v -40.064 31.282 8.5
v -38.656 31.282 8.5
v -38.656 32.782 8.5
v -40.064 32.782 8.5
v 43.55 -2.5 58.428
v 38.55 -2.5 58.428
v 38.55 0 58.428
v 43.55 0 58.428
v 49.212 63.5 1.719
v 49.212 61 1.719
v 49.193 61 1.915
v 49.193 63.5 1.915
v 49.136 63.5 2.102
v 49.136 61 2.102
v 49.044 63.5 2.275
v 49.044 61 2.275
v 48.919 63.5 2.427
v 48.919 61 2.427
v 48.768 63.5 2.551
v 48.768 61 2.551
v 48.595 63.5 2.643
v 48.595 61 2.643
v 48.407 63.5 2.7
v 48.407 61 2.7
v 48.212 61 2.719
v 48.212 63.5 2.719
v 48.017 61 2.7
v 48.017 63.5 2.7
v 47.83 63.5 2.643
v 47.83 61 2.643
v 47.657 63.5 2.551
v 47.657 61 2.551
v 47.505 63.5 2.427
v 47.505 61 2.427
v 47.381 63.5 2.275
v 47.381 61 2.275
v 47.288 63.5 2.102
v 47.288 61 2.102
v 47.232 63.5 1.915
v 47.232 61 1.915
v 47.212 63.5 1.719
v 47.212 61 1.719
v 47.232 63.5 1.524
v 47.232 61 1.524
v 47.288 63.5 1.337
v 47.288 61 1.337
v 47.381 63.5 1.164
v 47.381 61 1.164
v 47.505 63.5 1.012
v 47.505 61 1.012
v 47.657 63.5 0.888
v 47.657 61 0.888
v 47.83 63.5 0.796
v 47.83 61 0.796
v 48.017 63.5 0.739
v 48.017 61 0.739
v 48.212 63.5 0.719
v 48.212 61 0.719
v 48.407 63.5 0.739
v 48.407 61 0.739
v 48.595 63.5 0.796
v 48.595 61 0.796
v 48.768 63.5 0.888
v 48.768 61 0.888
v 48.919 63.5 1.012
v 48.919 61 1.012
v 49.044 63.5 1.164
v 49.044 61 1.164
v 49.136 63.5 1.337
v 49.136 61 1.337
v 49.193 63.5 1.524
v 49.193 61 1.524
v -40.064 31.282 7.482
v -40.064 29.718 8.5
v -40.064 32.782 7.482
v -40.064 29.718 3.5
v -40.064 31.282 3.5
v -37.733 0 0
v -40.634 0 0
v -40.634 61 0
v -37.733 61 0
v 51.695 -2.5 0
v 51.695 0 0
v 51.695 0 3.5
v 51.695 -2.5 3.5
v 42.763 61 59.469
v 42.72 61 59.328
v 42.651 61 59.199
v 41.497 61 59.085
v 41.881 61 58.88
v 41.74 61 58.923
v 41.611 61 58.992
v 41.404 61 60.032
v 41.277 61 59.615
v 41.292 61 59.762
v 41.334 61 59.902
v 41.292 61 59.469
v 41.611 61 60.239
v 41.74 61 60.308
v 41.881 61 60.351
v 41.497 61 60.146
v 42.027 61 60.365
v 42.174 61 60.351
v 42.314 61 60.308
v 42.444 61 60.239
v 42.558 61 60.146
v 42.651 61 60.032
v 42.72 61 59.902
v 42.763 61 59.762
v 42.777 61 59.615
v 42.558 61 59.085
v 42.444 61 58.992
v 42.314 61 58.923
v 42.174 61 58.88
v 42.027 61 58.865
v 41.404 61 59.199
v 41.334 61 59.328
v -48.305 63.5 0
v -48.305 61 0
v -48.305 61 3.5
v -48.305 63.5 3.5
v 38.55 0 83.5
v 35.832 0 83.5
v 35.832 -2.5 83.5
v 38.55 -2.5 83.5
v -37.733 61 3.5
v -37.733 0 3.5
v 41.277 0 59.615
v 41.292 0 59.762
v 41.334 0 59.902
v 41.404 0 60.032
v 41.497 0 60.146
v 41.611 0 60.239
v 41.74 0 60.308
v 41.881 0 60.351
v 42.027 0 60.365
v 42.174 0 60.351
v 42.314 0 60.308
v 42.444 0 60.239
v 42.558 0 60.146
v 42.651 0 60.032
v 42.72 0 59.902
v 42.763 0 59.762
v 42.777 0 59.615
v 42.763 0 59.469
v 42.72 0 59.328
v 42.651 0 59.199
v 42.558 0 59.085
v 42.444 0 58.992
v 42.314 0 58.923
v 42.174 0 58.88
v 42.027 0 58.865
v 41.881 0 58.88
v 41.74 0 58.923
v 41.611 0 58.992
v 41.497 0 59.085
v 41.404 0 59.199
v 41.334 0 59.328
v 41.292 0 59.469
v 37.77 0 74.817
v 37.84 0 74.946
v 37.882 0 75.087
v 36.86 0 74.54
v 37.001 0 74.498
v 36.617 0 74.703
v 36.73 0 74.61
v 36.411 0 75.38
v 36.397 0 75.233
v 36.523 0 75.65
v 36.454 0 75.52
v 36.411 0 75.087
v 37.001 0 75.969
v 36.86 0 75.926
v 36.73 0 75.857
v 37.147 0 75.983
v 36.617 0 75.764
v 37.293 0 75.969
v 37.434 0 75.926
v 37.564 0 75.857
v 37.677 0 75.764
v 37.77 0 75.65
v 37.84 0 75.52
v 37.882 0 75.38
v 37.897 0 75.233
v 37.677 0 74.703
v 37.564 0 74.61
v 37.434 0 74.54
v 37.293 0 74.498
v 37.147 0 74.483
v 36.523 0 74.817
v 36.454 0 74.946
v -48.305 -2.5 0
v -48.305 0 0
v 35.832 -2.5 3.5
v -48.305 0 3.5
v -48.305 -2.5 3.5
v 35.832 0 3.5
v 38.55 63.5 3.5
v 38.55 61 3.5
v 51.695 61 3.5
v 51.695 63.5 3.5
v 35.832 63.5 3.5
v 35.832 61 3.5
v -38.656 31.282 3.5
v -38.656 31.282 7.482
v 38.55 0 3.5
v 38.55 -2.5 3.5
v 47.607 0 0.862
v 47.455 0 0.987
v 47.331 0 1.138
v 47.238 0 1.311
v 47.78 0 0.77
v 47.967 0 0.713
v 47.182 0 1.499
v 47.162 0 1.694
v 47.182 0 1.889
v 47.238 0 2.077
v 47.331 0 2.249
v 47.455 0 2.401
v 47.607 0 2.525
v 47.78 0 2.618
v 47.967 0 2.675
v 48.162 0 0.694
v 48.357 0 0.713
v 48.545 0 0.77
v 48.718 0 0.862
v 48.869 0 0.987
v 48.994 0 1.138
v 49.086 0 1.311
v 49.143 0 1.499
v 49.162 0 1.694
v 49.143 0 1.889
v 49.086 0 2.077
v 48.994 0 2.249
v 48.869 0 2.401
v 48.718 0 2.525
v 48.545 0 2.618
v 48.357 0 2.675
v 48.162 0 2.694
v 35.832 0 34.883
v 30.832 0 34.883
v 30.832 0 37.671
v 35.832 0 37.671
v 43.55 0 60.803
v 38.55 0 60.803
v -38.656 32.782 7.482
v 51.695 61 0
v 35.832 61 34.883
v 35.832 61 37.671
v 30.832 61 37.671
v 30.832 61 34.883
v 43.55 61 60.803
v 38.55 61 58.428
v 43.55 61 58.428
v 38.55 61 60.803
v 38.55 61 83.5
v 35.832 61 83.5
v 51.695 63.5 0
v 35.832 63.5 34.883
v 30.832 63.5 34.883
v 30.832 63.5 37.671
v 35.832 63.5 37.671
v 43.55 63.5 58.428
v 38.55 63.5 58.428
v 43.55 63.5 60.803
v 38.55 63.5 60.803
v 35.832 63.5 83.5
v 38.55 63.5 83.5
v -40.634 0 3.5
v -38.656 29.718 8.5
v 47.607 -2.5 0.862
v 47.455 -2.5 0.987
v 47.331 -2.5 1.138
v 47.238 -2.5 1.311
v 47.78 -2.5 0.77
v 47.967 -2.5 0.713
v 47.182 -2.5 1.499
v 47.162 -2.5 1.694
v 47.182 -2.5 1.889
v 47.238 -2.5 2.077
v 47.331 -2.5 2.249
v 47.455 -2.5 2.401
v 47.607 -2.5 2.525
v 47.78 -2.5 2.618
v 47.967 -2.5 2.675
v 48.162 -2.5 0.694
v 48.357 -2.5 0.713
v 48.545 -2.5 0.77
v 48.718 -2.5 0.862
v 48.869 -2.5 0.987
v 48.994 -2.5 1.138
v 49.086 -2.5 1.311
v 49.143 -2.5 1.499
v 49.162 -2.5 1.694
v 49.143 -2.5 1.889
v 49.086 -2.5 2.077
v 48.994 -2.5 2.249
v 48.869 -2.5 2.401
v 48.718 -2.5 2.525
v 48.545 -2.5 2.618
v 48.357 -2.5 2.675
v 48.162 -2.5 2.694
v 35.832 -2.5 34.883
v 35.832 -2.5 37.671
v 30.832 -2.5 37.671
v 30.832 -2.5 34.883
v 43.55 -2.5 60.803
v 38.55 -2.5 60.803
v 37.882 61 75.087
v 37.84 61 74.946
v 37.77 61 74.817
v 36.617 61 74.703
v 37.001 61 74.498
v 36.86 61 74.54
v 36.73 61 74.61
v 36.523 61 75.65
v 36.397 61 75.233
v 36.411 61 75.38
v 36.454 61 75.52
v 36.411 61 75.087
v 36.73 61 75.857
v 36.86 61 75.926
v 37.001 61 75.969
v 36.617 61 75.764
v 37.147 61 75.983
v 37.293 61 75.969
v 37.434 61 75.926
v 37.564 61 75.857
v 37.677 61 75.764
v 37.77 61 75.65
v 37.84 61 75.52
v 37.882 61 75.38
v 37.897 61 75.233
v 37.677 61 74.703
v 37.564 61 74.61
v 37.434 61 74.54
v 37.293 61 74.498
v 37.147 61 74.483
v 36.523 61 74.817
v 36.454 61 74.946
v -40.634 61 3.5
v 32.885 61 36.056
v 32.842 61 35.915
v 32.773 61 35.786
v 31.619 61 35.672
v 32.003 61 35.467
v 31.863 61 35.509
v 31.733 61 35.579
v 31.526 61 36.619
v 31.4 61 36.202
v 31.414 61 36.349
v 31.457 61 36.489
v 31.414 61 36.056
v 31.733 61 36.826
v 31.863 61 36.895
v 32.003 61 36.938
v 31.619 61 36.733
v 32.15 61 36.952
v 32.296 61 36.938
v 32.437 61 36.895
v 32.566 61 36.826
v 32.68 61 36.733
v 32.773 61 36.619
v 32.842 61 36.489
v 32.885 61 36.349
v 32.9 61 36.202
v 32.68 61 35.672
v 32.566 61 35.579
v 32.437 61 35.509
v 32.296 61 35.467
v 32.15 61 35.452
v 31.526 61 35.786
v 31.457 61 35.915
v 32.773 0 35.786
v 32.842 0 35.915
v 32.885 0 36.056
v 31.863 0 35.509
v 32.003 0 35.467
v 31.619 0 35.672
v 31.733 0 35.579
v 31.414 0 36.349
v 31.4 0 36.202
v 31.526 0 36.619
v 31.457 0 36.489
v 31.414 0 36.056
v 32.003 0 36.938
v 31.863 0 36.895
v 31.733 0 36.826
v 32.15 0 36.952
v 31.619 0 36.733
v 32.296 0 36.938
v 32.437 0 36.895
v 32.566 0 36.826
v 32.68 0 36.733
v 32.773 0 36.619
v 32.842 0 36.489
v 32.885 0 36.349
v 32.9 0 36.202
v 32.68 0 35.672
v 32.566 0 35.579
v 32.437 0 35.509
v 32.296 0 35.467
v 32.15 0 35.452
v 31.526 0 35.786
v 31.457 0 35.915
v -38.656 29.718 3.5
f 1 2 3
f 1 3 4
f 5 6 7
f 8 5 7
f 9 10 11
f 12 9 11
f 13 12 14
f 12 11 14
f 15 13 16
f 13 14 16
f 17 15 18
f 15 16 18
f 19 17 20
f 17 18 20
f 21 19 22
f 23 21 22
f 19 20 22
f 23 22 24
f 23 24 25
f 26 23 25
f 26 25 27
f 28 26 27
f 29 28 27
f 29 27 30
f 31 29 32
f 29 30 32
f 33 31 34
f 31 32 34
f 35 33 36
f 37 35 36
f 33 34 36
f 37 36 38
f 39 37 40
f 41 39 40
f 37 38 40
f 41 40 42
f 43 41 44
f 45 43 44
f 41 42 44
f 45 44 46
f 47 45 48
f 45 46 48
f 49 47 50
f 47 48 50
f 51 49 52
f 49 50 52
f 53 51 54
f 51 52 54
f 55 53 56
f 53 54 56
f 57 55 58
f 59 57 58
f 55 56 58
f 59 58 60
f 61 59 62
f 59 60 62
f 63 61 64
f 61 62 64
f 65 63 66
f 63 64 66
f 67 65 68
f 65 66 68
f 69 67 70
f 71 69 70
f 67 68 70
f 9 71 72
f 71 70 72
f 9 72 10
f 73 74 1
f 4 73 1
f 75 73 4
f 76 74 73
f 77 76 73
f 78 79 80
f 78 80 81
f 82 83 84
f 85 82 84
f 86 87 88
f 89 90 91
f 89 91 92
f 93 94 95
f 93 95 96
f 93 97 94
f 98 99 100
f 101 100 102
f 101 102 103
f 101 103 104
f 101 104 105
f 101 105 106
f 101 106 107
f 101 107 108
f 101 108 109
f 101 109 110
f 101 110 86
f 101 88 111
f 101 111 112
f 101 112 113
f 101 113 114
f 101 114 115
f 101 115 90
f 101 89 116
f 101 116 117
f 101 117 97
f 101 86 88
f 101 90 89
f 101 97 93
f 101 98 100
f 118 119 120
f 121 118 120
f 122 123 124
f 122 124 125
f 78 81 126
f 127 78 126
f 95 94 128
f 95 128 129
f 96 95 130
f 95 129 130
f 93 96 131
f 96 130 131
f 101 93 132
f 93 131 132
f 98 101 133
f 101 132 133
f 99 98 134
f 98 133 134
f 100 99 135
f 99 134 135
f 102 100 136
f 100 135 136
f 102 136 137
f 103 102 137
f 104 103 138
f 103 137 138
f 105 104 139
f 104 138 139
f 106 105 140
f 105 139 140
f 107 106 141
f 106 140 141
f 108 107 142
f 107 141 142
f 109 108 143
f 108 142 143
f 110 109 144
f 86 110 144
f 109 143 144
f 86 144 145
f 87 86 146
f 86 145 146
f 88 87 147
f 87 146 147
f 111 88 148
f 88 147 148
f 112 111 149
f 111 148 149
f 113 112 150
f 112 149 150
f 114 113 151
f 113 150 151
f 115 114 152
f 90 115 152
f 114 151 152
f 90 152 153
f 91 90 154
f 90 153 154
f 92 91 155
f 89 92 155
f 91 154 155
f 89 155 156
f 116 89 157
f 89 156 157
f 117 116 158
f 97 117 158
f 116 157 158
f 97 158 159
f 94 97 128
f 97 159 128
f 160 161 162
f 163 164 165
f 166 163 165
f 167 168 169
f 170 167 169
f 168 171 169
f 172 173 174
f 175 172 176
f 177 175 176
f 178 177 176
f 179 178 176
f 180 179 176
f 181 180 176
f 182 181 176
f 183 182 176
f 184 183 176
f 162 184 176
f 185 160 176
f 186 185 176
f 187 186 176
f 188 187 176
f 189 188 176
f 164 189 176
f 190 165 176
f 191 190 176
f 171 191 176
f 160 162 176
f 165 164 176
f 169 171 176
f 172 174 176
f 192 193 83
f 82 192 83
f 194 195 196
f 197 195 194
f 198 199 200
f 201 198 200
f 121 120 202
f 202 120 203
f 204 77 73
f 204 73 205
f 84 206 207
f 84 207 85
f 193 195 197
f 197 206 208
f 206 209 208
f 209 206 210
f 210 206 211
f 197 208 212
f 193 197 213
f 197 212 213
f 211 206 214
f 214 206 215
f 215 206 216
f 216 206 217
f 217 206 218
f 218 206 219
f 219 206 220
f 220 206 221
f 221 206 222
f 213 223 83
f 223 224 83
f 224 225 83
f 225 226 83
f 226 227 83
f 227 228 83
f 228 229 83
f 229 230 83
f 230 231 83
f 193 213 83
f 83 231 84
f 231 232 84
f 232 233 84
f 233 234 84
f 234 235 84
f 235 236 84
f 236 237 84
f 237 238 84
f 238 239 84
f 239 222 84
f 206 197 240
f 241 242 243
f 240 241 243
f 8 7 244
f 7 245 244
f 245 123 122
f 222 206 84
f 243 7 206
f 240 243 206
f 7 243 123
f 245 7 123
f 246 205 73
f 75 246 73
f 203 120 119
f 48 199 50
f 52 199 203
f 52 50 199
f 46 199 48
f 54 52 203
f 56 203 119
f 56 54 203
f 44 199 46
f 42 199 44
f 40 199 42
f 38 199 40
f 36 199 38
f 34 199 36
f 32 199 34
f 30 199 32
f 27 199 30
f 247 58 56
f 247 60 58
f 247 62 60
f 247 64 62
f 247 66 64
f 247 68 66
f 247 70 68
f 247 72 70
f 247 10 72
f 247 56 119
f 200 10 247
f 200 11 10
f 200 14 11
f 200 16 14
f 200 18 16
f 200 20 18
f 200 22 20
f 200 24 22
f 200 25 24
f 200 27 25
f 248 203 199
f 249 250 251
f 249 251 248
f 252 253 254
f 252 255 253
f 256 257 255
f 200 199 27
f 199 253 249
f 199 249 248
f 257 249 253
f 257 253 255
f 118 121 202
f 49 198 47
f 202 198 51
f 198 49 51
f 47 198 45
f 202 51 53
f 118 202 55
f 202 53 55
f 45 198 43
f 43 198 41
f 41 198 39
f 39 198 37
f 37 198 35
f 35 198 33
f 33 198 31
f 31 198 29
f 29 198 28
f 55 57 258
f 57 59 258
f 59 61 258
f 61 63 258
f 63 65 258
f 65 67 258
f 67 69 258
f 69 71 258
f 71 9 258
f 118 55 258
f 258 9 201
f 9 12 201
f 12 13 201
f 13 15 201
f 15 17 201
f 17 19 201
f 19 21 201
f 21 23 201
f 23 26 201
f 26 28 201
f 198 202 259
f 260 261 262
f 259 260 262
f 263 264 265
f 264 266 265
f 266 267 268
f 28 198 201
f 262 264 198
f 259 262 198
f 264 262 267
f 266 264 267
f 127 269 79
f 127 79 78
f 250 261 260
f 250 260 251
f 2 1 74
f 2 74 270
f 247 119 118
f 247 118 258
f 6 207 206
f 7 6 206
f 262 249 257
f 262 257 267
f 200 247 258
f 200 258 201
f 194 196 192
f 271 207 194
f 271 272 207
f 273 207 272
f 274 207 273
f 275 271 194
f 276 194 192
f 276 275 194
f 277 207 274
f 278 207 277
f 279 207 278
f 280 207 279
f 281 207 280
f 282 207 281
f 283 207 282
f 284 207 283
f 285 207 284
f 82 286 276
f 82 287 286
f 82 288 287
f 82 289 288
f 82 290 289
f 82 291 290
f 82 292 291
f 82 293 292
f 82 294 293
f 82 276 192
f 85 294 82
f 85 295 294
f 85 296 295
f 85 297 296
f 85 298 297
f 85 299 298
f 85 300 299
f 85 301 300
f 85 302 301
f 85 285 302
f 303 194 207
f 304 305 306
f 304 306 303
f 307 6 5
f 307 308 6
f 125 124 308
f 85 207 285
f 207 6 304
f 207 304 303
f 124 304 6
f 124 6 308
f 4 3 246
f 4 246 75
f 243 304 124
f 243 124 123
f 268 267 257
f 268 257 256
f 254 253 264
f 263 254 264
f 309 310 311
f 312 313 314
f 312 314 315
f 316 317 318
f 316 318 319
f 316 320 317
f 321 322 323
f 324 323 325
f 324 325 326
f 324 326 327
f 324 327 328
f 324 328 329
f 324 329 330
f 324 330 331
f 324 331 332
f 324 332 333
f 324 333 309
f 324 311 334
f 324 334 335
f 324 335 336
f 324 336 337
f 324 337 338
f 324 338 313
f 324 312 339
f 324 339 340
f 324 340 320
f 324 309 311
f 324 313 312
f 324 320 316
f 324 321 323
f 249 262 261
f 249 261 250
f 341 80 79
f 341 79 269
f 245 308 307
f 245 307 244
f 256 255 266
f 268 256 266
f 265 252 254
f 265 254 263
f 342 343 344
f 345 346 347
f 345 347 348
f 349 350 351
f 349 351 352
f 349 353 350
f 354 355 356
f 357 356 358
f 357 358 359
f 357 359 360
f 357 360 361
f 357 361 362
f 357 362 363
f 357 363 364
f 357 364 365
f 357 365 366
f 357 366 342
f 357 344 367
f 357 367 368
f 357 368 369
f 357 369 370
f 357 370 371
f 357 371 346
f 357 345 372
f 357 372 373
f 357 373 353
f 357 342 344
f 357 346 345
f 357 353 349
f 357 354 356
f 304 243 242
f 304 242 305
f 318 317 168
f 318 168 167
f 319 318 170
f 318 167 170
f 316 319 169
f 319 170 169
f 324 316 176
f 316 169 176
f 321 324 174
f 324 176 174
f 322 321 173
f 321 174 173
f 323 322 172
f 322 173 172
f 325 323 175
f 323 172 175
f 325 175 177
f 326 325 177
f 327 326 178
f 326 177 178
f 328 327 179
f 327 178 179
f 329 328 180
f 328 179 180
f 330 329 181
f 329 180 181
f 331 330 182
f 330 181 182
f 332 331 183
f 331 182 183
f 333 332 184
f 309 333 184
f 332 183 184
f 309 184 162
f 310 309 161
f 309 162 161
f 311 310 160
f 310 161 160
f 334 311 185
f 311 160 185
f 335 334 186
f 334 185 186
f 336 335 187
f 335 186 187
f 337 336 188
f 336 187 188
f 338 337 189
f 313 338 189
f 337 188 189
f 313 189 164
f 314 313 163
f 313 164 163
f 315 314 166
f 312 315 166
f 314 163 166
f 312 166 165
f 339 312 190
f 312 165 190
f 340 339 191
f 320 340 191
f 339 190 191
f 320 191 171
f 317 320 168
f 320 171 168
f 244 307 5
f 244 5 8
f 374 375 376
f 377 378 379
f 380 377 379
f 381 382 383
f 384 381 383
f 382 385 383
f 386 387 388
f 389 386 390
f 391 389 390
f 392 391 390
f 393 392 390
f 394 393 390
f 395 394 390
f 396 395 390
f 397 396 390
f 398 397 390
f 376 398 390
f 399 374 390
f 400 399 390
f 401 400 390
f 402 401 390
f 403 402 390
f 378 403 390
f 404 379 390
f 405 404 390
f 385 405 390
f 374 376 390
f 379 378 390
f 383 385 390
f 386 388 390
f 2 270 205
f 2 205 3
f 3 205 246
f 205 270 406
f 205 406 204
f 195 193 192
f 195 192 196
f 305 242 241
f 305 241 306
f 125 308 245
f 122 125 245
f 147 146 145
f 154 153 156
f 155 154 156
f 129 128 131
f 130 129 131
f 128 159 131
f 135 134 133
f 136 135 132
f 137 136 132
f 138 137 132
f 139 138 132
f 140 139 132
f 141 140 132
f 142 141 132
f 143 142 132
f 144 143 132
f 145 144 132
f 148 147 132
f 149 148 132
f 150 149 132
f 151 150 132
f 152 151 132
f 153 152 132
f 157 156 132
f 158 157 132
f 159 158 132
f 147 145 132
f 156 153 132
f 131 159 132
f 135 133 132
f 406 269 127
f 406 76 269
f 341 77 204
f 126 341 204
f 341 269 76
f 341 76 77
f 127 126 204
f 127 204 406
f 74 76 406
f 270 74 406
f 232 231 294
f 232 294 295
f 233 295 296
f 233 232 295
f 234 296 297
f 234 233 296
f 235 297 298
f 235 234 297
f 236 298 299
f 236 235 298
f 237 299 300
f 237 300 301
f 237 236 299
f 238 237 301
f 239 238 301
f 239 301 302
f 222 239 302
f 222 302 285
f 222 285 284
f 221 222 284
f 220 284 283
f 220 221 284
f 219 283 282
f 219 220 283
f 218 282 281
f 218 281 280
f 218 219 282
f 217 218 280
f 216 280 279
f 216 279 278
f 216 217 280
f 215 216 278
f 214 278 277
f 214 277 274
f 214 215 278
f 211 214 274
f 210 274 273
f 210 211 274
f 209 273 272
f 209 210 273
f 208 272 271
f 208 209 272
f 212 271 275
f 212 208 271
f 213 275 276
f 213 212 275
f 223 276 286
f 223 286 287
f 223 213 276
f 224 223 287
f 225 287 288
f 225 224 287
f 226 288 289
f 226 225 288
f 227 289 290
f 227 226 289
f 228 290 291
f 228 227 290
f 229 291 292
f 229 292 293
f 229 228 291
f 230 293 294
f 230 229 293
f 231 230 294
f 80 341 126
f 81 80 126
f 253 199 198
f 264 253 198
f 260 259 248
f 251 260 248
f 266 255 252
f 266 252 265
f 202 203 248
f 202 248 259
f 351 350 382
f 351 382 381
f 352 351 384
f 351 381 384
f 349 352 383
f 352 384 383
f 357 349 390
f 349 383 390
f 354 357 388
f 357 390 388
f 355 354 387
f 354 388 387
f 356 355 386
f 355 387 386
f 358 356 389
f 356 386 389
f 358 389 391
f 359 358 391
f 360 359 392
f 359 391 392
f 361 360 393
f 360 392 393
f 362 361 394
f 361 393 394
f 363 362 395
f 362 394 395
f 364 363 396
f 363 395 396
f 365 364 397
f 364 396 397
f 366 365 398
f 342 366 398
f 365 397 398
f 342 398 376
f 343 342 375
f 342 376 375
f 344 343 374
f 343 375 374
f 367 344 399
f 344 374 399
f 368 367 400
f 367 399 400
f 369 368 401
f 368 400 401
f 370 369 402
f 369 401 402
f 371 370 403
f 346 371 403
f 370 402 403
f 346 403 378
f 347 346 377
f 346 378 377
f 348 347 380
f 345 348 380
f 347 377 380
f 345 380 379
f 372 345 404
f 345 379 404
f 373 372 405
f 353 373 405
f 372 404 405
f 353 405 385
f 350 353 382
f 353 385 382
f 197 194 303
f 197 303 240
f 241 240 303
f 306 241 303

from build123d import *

# Parameters (mm, degrees)
F0_W      = 100
F0_H      = 3.5
F0_R      = 1
F1_DEPTH  = 2.5
F4_W      = 100
F4_H      = 3.5
F4_R      = 1
F5_DEPTH  = 2.5
F6_W      = 2.901047
F6_H      = 3.5
F7_DEPTH  = 61
F8_W      = 2.717946
F8_H      = 2.5
F9_DEPTH  = 80
F10_DEPTH = 80
F11_W     = 2.5
F11_H     = 2.375175
F12_DEPTH = 5
F13_W     = 2.5
F13_H     = 2.375175
F14_DEPTH = 5
F15_R     = 0.75
F16_DEPTH = 61
F17_W     = 2.5
F17_H     = 2.788253
F18_DEPTH = 5
F19_R     = 0.75
F20_DEPTH = 61
F21_W     = 2.5
F21_H     = 2.788253
F22_DEPTH = 5
F23_R     = 0.75
F24_DEPTH = 61
F25_W     = 1.408268
F25_H     = 1.564
F26_DEPTH = 5
F27_W     = 1.408268
F27_H     = 1.018011
F28_DEPTH = 1.5


with BuildPart() as f1:
    # F0 (on Front) → F1 (new body)
    with BuildSketch(Plane.XZ):
        with Locations((1.694917, 1.75)):
            Rectangle(F0_W, F0_H)
        with Locations((48.162378, 1.693871)):
            Circle(F0_R, mode=Mode.SUBTRACT)
    extrude(amount=F1_DEPTH)

    # F8 (on face) → F9 (join)
    with BuildSketch(Plane.XY.offset(3.5)):
        with Locations((37.190838, -1.25)):
            Rectangle(F8_W, F8_H)
    extrude(amount=F9_DEPTH)

    # F11 (on face) → F12 (join)
    with BuildSketch(Plane.YZ.offset(38.549811)):
        with Locations((-1.25, 59.615457)):
            Rectangle(F11_W, F11_H)
    extrude(amount=F12_DEPTH)

    # F21 (on face) → F22 (join)
    with BuildSketch(Plane(origin=(35.831865, 0, 0), x_dir=(0, -1, 0), z_dir=(-1, 0, 0))):
        with Locations((1.25, 36.276765)):
            Rectangle(F21_W, F21_H)
    extrude(amount=F22_DEPTH)


with BuildPart() as f5:
    # F4 (on plane+point) → F5 (new body)
    with BuildSketch(Plane.XZ.offset(-61)):
        with Locations((1.694917, 1.75)):
            Rectangle(F4_W, F4_H)
        with Locations((48.212361, 1.719477)):
            Circle(F4_R, mode=Mode.SUBTRACT)
    extrude(amount=-F5_DEPTH)

    # F8 (on face) → F10 (join)
    with BuildSketch(Plane.XY.offset(3.5)):
        with Locations((37.190838, 62.25)):
            Rectangle(F8_W, F8_H)
    extrude(amount=F10_DEPTH)

    # F13 (on face) → F14 (join)
    with BuildSketch(Plane.YZ.offset(38.549811)):
        with Locations((62.25, 59.615457)):
            Rectangle(F13_W, F13_H)
    extrude(amount=F14_DEPTH)

    # F17 (on face) → F18 (join)
    with BuildSketch(Plane(origin=(35.831865, 0, 0), x_dir=(0, -1, 0), z_dir=(-1, 0, 0))):
        with Locations((-62.25, 36.276765)):
            Rectangle(F17_W, F17_H)
    extrude(amount=F18_DEPTH)


with BuildPart() as f7:
    # F6 (on face) → F7 (new body, through all)
    with BuildSketch(Plane.XZ.offset(-61)):
        with Locations((-39.183256, 1.75)):
            Rectangle(F6_W, F6_H)
    extrude(amount=F7_DEPTH)

    # F25 (on face) → F26 (join)
    with BuildSketch(Plane.XY.offset(3.5)):
        with Locations((-39.359858, 30.5)):
            Rectangle(F25_W, F25_H)
    extrude(amount=F26_DEPTH)

    # F27 (on face) → F28 (join)
    with BuildSketch(Plane(origin=(0, 31.282, 0), x_dir=(-1, 0, 0), z_dir=(0, 1, 0))):
        with Locations((39.359858, 7.990994)):
            Rectangle(F27_W, F27_H)
    extrude(amount=F28_DEPTH)


with BuildPart() as f16:
    # F15 (on face) → F16 (new body, through all)
    with BuildSketch(Plane(origin=(0, 0, 0), x_dir=(-1, 0, 0), z_dir=(0, 1, 0))):
        with Locations((-42.027365, 59.615457)):
            Circle(F15_R)
    extrude(amount=F16_DEPTH)


with BuildPart() as f20:
    # F19 (on face) → F20 (new body, through all)
    with BuildSketch(Plane(origin=(0, 0, 0), x_dir=(-1, 0, 0), z_dir=(0, 1, 0))):
        with Locations((-37.146874, 75.2334)):
            Circle(F19_R)
    extrude(amount=F20_DEPTH)


with BuildPart() as f24:
    # F23 (on face) → F24 (new body, through all)
    with BuildSketch(Plane(origin=(0, 0, 0), x_dir=(-1, 0, 0), z_dir=(0, 1, 0))):
        with Locations((-32.149564, 36.202215)):
            Circle(F23_R)
    extrude(amount=F24_DEPTH)


solid = Compound([f1.part, f5.part, f7.part, f16.part, f20.part, f24.part])
